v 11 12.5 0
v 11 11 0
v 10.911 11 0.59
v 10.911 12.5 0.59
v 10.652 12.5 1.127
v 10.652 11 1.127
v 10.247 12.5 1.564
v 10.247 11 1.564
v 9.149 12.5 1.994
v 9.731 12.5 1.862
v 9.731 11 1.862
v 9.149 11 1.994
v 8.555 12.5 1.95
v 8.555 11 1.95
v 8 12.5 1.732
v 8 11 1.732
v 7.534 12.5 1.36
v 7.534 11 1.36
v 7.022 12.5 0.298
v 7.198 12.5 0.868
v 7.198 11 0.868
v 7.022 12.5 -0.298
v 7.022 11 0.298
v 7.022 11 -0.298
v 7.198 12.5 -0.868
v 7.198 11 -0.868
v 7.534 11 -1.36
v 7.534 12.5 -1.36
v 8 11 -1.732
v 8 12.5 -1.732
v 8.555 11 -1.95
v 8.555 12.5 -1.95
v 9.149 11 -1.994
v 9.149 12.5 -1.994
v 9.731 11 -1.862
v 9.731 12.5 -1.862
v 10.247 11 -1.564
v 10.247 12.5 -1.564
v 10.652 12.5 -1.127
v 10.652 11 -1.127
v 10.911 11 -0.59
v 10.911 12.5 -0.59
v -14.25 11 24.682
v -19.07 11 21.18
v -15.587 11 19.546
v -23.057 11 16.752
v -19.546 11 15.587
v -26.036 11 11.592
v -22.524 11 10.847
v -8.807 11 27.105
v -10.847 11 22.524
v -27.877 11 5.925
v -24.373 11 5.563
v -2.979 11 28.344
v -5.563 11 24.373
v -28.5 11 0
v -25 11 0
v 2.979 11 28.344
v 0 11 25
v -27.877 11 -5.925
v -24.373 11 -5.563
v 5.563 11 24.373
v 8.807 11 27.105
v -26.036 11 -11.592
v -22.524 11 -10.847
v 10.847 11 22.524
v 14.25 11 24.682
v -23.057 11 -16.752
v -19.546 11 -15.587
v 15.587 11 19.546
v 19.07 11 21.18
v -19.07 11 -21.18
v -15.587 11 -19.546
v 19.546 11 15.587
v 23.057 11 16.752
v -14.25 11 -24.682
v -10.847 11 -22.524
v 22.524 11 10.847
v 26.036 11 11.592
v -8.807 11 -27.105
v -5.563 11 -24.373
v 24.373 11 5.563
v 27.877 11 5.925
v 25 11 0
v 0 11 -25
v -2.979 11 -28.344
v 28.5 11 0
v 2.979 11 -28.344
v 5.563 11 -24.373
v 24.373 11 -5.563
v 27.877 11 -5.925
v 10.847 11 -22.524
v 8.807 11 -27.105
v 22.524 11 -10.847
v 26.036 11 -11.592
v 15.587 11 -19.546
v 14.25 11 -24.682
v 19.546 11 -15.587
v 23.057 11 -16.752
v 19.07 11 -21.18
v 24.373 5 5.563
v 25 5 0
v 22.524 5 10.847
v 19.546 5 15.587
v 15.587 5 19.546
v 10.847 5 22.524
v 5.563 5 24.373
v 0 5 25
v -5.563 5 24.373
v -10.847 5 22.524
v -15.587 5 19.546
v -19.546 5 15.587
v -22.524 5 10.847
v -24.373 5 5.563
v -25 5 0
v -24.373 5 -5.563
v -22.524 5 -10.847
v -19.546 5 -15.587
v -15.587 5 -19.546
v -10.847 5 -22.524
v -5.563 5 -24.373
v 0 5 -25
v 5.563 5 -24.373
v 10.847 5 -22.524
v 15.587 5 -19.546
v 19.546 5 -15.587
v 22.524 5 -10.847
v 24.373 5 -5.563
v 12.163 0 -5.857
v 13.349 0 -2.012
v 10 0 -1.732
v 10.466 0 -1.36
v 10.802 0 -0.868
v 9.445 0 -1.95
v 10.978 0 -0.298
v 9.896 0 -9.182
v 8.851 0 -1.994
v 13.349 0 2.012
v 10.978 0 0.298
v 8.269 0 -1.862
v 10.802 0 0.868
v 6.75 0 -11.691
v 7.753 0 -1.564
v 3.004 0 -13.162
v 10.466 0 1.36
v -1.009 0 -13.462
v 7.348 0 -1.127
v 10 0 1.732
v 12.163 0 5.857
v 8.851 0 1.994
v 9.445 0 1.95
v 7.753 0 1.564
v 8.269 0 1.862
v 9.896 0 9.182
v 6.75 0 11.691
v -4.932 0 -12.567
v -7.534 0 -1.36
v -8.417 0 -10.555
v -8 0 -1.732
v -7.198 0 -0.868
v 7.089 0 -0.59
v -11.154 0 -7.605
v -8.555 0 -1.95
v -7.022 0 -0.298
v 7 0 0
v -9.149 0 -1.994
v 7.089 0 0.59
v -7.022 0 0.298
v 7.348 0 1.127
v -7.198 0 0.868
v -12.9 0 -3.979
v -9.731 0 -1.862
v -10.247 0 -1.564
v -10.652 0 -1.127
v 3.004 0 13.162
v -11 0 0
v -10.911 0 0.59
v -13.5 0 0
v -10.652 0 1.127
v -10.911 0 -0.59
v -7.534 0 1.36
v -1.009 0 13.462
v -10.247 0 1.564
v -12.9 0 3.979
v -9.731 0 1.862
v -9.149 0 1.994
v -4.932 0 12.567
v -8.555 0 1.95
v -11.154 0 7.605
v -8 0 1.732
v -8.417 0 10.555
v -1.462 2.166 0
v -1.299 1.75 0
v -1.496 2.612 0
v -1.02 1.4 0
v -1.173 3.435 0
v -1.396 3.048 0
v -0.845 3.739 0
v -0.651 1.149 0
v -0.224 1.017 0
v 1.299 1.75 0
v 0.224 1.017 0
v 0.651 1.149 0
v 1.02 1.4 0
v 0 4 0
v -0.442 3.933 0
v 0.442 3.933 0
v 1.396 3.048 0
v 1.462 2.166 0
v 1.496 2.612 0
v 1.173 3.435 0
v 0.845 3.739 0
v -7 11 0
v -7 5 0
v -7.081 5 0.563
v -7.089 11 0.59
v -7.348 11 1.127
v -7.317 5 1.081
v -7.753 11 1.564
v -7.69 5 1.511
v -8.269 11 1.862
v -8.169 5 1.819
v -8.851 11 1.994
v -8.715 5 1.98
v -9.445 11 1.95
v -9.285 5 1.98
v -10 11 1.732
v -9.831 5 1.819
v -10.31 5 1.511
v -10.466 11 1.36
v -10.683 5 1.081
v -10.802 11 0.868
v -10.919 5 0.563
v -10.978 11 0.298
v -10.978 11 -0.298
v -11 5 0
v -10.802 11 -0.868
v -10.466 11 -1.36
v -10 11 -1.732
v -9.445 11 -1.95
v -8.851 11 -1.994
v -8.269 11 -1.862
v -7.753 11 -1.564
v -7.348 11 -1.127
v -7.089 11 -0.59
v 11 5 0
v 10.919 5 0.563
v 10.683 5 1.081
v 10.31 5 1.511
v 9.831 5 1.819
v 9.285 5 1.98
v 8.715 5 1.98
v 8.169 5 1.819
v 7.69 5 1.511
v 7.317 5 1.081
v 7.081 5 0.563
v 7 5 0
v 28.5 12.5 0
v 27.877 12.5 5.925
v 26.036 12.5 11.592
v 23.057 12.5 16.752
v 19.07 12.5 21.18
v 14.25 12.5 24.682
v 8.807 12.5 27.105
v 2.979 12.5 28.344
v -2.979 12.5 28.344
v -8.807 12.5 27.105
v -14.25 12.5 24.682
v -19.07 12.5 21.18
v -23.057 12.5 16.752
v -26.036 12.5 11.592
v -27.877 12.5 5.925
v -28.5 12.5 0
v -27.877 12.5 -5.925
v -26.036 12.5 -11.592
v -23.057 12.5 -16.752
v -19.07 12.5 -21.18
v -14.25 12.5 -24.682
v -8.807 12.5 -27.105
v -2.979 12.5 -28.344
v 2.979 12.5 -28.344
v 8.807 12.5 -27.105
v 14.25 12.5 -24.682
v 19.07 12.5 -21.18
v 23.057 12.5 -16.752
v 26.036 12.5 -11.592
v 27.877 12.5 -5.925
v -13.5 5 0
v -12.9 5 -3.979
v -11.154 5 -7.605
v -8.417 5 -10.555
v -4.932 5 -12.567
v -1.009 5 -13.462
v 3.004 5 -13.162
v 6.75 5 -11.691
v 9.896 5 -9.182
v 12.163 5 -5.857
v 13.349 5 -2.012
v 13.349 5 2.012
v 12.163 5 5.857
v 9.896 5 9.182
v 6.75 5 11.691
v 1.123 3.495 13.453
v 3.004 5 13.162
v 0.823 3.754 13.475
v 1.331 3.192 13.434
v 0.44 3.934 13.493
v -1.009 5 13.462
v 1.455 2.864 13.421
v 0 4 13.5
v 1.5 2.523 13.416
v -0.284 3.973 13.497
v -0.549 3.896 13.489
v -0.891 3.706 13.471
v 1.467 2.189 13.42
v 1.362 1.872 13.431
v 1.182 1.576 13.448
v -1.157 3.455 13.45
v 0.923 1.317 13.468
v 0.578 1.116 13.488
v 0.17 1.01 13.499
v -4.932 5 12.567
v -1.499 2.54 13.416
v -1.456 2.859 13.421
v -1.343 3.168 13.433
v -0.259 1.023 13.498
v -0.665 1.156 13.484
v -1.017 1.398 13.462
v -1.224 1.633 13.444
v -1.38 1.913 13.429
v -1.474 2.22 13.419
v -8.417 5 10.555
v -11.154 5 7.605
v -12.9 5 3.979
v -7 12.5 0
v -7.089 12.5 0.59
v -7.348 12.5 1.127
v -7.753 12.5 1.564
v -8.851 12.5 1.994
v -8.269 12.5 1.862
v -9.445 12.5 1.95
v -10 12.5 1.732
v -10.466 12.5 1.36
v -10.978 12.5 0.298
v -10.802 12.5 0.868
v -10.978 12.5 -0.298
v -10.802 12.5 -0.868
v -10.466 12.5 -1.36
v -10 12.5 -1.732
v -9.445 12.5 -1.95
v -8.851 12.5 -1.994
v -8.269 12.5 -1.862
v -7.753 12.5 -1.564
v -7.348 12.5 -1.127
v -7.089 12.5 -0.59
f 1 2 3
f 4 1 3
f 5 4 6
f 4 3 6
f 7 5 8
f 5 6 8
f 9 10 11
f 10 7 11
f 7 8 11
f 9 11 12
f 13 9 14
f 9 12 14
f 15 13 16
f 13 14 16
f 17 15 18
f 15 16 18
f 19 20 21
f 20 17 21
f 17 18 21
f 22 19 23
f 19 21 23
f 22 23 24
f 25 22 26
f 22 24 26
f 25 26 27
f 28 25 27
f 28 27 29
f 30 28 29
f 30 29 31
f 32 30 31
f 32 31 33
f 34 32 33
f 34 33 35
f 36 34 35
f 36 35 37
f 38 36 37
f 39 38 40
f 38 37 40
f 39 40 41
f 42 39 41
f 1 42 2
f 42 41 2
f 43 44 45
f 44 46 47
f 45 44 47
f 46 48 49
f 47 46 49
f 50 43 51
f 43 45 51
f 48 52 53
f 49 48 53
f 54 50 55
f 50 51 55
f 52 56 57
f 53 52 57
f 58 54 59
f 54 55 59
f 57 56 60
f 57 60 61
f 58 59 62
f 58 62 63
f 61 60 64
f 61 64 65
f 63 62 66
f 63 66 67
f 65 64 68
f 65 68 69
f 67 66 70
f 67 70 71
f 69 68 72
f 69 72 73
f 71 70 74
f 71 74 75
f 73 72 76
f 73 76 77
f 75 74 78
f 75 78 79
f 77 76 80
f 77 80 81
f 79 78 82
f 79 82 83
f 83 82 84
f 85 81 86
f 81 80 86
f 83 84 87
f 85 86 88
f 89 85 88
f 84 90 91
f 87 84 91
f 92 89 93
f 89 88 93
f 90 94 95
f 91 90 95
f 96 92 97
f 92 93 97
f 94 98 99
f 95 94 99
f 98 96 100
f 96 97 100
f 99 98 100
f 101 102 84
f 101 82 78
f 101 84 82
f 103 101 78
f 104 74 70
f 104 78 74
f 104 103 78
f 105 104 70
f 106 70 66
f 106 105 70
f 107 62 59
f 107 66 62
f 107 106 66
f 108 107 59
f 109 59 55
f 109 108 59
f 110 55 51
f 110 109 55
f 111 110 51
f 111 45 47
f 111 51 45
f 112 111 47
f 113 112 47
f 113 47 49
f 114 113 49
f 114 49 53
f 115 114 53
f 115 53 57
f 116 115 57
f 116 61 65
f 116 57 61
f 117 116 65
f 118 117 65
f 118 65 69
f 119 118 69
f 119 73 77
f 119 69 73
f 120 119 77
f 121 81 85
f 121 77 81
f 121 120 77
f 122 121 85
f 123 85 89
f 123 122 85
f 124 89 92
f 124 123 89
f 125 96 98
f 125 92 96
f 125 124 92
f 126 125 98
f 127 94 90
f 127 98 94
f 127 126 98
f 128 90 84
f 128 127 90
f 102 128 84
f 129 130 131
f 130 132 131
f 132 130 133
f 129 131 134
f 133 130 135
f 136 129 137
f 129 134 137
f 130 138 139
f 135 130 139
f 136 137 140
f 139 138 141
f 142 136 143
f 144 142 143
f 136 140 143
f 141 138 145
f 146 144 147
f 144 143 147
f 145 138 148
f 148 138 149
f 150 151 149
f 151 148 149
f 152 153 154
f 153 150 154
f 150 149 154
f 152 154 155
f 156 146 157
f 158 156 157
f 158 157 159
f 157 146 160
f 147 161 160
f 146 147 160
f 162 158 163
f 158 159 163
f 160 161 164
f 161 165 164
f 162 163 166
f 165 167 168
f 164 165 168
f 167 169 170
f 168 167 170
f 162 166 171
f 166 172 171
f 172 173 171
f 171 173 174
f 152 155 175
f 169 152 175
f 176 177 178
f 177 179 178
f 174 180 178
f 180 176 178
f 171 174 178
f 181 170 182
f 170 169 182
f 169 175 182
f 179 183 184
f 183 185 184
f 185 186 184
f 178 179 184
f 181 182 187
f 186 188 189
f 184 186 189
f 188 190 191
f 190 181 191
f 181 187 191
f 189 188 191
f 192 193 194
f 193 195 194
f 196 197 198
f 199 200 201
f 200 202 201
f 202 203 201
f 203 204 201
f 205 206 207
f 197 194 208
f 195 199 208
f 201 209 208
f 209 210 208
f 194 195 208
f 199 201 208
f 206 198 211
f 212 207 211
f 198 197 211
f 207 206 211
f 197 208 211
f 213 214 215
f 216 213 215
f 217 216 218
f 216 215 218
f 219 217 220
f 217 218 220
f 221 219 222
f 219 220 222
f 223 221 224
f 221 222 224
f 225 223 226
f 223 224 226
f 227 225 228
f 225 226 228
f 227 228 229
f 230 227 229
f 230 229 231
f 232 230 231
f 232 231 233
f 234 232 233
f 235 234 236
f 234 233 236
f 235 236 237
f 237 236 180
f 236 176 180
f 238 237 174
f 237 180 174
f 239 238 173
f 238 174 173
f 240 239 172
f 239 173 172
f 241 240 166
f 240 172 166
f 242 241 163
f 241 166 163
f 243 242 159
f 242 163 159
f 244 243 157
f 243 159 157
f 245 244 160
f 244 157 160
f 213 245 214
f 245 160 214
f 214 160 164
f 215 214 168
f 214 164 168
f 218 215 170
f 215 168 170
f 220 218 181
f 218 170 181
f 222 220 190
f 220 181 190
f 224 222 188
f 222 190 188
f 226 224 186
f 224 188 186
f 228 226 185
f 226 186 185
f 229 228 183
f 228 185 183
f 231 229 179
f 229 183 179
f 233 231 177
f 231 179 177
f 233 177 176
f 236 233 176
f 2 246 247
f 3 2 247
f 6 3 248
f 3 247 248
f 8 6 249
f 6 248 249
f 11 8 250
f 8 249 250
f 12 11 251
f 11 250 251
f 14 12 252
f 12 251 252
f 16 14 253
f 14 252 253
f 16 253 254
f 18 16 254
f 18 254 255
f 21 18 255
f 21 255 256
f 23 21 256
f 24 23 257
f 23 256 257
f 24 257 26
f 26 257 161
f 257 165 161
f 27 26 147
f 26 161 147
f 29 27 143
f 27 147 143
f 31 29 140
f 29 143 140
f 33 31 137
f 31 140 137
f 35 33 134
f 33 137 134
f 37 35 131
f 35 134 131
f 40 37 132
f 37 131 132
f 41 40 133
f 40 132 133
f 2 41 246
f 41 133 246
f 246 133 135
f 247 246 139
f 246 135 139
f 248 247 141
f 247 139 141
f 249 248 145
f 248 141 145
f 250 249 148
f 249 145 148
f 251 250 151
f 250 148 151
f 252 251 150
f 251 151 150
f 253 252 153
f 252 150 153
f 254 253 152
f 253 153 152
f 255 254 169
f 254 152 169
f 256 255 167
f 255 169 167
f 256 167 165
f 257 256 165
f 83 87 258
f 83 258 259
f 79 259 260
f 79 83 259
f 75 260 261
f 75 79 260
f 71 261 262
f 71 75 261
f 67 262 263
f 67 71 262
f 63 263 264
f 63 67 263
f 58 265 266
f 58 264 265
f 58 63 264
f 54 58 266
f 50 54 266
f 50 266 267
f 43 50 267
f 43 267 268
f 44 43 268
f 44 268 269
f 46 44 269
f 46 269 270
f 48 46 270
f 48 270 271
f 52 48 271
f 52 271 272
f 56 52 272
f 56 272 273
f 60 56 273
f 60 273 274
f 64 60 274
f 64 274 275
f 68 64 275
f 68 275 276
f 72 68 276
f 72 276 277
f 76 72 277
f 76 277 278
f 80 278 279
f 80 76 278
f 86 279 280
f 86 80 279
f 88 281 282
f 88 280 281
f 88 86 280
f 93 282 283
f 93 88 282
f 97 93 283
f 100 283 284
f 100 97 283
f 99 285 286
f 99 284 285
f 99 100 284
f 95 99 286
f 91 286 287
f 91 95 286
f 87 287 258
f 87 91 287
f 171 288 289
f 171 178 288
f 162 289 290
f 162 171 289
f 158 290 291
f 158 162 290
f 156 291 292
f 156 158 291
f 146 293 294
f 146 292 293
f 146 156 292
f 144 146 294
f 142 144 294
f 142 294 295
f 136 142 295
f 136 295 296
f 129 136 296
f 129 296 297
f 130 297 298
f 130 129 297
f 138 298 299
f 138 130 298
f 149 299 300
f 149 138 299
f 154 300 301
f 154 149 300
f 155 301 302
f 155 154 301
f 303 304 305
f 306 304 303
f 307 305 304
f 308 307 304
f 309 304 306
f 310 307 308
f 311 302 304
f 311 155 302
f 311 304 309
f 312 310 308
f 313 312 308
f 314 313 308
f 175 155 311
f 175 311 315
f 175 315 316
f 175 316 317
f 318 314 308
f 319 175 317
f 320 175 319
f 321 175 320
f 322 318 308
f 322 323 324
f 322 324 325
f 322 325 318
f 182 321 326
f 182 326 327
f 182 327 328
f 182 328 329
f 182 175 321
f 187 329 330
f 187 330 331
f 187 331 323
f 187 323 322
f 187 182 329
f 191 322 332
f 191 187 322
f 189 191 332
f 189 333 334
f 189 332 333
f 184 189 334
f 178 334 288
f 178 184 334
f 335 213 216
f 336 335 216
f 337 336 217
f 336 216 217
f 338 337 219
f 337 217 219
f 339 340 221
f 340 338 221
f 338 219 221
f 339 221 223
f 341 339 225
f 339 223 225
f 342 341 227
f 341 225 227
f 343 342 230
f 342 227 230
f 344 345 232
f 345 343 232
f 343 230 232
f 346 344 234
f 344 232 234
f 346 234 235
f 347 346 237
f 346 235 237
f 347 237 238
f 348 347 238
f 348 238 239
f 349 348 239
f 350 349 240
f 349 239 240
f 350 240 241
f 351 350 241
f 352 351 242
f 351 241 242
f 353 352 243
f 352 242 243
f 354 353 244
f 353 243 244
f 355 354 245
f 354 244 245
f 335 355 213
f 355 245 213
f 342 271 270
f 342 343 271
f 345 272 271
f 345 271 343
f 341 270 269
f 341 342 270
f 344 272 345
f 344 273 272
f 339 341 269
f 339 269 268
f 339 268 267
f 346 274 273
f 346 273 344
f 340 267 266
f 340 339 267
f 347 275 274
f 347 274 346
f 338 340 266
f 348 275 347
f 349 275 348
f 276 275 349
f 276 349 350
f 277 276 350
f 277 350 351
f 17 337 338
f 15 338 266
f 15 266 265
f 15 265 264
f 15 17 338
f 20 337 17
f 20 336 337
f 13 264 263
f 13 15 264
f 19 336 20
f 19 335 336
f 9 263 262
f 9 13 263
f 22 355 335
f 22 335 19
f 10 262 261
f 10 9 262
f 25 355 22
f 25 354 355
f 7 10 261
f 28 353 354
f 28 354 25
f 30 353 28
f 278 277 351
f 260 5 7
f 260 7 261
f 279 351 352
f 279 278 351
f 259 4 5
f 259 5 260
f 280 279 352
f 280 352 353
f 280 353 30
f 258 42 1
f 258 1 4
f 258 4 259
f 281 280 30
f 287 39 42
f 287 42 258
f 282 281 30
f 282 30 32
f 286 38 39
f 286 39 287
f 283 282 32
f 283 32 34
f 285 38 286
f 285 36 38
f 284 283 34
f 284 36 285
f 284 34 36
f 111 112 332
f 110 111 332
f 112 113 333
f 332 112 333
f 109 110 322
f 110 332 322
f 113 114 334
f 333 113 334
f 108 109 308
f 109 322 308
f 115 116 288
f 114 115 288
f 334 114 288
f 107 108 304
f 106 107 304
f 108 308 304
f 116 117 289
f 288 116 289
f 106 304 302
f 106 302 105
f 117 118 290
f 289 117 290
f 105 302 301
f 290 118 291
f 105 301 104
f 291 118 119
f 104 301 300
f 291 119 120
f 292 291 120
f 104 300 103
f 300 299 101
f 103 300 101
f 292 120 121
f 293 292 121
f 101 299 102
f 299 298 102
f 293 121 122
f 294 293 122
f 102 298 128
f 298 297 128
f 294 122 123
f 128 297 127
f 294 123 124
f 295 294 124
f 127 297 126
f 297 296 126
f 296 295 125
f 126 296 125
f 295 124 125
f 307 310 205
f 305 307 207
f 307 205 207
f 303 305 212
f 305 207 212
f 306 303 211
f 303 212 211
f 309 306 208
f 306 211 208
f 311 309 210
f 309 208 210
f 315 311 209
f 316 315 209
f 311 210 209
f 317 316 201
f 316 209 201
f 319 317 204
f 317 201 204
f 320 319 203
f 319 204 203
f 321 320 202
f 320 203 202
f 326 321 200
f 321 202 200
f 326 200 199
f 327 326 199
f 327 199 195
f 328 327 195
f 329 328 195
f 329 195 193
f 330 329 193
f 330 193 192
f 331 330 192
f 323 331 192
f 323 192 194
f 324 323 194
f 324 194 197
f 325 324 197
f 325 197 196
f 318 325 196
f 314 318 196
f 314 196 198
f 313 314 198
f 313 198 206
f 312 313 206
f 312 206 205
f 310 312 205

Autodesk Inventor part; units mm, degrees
ref_plane "YZ Plane" through (0, 0, 0) normal (1, 0, 0) x (0, 1, 0)
ref_plane "XZ Plane" through (0, 0, 0) normal (0, 1, 0) x (-1, 0, 0)
sketch "Sketch1" plane through (0, 0, 0) normal (0, 1, 0) x (-1, 0, 0)
  circle A0 centre (0, 0) radius 13.5
  line L0 (0, 0) -> (9, 0)
  line L1 (0, 0) -> (-9, 0)
  circle A1 centre (-9, 0) radius 2
  circle A2 centre (9, 0) radius 2
  dimension "d0" = 27
  dimension "d1" = 9
  dimension "d2" = 9
  dimension "d3" = 4
  dimension "d4" = 4
extrude "Extrusion1" add sketch "Sketch1" along normal blind 5
sketch "Sketch2" plane through (0, 5, 0) normal (0, 1, 0) x (1, 0, 0)
  circle A0 centre (0, 0) radius 25
  circle A1 centre (-9, 0) radius 2 projected
  circle A2 centre (9, 0) radius 2 projected
  circle A3 centre (-9, 0) radius 2 projected
  circle A4 centre (-9, 0) radius 2
  circle A5 centre (9, 0) radius 2 projected
  circle A6 centre (9, 0) radius 2
  dimension "d7" = 50
extrude "Extrusion2" add sketch "Sketch2" along normal blind 6
sketch "Sketch3" plane through (0, 11, 0) normal (0, 1, 0) x (1, 0, 0)
  circle A0 centre (0, 0) radius 28.5
  circle A1 centre (-9, 0) radius 2 projected
  circle A2 centre (9, 0) radius 2 projected
  circle A3 centre (-9, 0) radius 2
  circle A4 centre (9, 0) radius 2 projected
  circle A5 centre (9, 0) radius 2
  dimension "d10" = 57
extrude "Extrusion4" add sketch "Sketch3" along normal blind 1.5
ref_plane "Work Plane1" through (-9, 0, 0) normal (0, 0, -1) x (0, 1, 0)
sketch "Sketch4" plane through (-9, 0, 0) normal (0, 0, -1) x (0, 1, 0)
  line L0 (0, 9) -> (5, 9)
  line L1 (5, -4.5) -> (5, 22.5) projected
  circle A0 centre (2.5, 9) radius 1.5
  dimension "d15" = 3
extrude "Extrusion5" cut sketch "Sketch4" against normal up to surface
properties part number "Wrist-Bearing Attachment"
